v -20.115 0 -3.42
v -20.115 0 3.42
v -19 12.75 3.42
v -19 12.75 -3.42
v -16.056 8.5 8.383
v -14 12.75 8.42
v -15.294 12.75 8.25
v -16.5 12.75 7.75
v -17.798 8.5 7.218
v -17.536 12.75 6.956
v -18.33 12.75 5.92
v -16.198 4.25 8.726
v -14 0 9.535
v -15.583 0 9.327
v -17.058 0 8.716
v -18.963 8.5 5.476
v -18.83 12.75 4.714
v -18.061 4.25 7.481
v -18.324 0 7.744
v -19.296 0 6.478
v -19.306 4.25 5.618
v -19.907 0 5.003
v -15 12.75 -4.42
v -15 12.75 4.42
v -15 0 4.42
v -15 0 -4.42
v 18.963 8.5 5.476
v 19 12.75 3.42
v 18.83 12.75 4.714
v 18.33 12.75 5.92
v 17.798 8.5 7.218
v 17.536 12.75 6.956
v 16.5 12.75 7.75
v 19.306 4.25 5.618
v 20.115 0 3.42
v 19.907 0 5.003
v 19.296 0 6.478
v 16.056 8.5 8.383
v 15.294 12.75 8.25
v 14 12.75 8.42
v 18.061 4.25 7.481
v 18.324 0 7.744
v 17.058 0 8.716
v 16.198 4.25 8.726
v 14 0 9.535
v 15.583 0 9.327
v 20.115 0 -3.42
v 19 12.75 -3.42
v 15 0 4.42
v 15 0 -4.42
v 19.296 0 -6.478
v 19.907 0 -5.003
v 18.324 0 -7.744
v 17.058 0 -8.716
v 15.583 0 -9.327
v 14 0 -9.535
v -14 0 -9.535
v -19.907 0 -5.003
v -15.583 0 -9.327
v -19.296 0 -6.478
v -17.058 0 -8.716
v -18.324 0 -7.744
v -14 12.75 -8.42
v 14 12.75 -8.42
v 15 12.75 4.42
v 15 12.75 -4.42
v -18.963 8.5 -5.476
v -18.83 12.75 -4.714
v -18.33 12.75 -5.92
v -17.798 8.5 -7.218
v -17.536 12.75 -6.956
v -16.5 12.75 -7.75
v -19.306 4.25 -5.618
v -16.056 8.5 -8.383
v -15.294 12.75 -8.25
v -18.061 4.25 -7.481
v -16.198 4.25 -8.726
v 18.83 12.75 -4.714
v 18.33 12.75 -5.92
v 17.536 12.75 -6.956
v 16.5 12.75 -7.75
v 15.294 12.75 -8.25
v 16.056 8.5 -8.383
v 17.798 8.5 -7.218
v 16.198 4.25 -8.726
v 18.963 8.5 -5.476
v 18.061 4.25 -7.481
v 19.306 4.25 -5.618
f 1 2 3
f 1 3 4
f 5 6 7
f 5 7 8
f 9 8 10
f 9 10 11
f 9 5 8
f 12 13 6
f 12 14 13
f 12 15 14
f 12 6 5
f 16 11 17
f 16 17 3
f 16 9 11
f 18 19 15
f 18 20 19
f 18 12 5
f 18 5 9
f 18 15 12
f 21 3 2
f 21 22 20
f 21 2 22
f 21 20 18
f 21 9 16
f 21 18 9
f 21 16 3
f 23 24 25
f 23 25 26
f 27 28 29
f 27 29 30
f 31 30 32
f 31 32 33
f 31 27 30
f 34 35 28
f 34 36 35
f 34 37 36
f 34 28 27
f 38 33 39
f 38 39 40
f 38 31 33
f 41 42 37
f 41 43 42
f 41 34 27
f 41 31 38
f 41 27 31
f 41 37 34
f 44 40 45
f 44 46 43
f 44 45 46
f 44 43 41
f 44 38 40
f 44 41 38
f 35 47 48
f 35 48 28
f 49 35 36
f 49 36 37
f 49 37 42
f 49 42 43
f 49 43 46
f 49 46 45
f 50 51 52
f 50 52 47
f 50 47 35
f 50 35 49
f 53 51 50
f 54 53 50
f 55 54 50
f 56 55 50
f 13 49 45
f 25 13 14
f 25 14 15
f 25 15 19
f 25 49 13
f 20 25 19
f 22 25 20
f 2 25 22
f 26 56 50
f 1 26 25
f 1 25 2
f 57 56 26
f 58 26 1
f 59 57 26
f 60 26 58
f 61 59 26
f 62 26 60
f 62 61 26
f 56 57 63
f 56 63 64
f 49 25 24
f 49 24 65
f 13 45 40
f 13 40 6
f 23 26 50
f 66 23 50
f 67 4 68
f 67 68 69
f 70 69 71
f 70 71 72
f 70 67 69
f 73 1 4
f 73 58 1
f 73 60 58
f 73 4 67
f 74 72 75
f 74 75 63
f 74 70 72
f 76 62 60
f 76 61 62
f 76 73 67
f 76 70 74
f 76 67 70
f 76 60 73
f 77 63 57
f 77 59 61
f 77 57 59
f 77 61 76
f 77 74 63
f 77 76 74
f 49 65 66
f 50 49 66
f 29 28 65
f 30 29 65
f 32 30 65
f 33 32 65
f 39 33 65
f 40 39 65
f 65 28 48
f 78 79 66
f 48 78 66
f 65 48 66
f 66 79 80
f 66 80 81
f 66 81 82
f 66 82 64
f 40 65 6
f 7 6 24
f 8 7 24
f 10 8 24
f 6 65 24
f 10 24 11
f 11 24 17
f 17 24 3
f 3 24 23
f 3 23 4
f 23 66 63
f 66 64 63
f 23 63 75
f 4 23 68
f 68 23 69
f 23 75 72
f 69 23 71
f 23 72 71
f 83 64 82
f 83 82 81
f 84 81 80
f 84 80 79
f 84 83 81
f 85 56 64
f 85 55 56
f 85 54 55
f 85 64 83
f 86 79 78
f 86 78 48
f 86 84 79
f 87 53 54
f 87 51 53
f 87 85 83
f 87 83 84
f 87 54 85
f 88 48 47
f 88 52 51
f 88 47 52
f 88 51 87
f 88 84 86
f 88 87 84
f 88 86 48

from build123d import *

# Parameters (mm, degrees)
SKETCH1_W           = 30
SKETCH1_H           = 8.84
BOSS_EXTRUDE1_DEPTH = 12.75
DRAFT1_ANGLE        = 5


with BuildPart() as part:
    # Sketch1 → Boss-Extrude1 (new body)
    with BuildSketch(Plane(origin=(0, 0, 0), x_dir=(1, 0, 0), z_dir=(0, 1, 0))):
        with BuildLine():
            Line((14, -8.42), (-14, -8.42))
            ThreePointArc((-14, -8.42), (-17.535533906, -6.955533906), (-19, -3.42))
            Line((-19, -3.42), (-19, 3.42))
            ThreePointArc((-19, 3.42), (-17.535533906, 6.955533906), (-14, 8.42))
            Line((-14, 8.42), (14, 8.42))
            ThreePointArc((14, 8.42), (17.535533906, 6.955533906), (19, 3.42))
            Line((19, 3.42), (19, -3.42))
            ThreePointArc((19, -3.42), (17.535533906, -6.955533906), (14, -8.42))
        make_face()
        Rectangle(SKETCH1_W, SKETCH1_H, mode=Mode.SUBTRACT)
    extrude(amount=BOSS_EXTRUDE1_DEPTH)

    # Draft1
    draft1_faces = [part.faces().sort_by_distance(p)[0] for p in [
        (-17.535533906, 6.375, 6.955533906),
        (-19, 6.375, 0),
        (-17.535533906, 6.375, -6.955533906),
        (0, 6.375, -8.42),
        (17.535533906, 6.375, -6.955533906),
        (19, 6.375, 0),
        (17.535533906, 6.375, 6.955533906),
        (0, 6.375, 8.42),
    ]]
    draft(draft1_faces, Plane(origin=(-14, 12.75, 3.42), x_dir=(0, 0, 1), z_dir=(0, 1, 0)), DRAFT1_ANGLE)


solid = part.part
